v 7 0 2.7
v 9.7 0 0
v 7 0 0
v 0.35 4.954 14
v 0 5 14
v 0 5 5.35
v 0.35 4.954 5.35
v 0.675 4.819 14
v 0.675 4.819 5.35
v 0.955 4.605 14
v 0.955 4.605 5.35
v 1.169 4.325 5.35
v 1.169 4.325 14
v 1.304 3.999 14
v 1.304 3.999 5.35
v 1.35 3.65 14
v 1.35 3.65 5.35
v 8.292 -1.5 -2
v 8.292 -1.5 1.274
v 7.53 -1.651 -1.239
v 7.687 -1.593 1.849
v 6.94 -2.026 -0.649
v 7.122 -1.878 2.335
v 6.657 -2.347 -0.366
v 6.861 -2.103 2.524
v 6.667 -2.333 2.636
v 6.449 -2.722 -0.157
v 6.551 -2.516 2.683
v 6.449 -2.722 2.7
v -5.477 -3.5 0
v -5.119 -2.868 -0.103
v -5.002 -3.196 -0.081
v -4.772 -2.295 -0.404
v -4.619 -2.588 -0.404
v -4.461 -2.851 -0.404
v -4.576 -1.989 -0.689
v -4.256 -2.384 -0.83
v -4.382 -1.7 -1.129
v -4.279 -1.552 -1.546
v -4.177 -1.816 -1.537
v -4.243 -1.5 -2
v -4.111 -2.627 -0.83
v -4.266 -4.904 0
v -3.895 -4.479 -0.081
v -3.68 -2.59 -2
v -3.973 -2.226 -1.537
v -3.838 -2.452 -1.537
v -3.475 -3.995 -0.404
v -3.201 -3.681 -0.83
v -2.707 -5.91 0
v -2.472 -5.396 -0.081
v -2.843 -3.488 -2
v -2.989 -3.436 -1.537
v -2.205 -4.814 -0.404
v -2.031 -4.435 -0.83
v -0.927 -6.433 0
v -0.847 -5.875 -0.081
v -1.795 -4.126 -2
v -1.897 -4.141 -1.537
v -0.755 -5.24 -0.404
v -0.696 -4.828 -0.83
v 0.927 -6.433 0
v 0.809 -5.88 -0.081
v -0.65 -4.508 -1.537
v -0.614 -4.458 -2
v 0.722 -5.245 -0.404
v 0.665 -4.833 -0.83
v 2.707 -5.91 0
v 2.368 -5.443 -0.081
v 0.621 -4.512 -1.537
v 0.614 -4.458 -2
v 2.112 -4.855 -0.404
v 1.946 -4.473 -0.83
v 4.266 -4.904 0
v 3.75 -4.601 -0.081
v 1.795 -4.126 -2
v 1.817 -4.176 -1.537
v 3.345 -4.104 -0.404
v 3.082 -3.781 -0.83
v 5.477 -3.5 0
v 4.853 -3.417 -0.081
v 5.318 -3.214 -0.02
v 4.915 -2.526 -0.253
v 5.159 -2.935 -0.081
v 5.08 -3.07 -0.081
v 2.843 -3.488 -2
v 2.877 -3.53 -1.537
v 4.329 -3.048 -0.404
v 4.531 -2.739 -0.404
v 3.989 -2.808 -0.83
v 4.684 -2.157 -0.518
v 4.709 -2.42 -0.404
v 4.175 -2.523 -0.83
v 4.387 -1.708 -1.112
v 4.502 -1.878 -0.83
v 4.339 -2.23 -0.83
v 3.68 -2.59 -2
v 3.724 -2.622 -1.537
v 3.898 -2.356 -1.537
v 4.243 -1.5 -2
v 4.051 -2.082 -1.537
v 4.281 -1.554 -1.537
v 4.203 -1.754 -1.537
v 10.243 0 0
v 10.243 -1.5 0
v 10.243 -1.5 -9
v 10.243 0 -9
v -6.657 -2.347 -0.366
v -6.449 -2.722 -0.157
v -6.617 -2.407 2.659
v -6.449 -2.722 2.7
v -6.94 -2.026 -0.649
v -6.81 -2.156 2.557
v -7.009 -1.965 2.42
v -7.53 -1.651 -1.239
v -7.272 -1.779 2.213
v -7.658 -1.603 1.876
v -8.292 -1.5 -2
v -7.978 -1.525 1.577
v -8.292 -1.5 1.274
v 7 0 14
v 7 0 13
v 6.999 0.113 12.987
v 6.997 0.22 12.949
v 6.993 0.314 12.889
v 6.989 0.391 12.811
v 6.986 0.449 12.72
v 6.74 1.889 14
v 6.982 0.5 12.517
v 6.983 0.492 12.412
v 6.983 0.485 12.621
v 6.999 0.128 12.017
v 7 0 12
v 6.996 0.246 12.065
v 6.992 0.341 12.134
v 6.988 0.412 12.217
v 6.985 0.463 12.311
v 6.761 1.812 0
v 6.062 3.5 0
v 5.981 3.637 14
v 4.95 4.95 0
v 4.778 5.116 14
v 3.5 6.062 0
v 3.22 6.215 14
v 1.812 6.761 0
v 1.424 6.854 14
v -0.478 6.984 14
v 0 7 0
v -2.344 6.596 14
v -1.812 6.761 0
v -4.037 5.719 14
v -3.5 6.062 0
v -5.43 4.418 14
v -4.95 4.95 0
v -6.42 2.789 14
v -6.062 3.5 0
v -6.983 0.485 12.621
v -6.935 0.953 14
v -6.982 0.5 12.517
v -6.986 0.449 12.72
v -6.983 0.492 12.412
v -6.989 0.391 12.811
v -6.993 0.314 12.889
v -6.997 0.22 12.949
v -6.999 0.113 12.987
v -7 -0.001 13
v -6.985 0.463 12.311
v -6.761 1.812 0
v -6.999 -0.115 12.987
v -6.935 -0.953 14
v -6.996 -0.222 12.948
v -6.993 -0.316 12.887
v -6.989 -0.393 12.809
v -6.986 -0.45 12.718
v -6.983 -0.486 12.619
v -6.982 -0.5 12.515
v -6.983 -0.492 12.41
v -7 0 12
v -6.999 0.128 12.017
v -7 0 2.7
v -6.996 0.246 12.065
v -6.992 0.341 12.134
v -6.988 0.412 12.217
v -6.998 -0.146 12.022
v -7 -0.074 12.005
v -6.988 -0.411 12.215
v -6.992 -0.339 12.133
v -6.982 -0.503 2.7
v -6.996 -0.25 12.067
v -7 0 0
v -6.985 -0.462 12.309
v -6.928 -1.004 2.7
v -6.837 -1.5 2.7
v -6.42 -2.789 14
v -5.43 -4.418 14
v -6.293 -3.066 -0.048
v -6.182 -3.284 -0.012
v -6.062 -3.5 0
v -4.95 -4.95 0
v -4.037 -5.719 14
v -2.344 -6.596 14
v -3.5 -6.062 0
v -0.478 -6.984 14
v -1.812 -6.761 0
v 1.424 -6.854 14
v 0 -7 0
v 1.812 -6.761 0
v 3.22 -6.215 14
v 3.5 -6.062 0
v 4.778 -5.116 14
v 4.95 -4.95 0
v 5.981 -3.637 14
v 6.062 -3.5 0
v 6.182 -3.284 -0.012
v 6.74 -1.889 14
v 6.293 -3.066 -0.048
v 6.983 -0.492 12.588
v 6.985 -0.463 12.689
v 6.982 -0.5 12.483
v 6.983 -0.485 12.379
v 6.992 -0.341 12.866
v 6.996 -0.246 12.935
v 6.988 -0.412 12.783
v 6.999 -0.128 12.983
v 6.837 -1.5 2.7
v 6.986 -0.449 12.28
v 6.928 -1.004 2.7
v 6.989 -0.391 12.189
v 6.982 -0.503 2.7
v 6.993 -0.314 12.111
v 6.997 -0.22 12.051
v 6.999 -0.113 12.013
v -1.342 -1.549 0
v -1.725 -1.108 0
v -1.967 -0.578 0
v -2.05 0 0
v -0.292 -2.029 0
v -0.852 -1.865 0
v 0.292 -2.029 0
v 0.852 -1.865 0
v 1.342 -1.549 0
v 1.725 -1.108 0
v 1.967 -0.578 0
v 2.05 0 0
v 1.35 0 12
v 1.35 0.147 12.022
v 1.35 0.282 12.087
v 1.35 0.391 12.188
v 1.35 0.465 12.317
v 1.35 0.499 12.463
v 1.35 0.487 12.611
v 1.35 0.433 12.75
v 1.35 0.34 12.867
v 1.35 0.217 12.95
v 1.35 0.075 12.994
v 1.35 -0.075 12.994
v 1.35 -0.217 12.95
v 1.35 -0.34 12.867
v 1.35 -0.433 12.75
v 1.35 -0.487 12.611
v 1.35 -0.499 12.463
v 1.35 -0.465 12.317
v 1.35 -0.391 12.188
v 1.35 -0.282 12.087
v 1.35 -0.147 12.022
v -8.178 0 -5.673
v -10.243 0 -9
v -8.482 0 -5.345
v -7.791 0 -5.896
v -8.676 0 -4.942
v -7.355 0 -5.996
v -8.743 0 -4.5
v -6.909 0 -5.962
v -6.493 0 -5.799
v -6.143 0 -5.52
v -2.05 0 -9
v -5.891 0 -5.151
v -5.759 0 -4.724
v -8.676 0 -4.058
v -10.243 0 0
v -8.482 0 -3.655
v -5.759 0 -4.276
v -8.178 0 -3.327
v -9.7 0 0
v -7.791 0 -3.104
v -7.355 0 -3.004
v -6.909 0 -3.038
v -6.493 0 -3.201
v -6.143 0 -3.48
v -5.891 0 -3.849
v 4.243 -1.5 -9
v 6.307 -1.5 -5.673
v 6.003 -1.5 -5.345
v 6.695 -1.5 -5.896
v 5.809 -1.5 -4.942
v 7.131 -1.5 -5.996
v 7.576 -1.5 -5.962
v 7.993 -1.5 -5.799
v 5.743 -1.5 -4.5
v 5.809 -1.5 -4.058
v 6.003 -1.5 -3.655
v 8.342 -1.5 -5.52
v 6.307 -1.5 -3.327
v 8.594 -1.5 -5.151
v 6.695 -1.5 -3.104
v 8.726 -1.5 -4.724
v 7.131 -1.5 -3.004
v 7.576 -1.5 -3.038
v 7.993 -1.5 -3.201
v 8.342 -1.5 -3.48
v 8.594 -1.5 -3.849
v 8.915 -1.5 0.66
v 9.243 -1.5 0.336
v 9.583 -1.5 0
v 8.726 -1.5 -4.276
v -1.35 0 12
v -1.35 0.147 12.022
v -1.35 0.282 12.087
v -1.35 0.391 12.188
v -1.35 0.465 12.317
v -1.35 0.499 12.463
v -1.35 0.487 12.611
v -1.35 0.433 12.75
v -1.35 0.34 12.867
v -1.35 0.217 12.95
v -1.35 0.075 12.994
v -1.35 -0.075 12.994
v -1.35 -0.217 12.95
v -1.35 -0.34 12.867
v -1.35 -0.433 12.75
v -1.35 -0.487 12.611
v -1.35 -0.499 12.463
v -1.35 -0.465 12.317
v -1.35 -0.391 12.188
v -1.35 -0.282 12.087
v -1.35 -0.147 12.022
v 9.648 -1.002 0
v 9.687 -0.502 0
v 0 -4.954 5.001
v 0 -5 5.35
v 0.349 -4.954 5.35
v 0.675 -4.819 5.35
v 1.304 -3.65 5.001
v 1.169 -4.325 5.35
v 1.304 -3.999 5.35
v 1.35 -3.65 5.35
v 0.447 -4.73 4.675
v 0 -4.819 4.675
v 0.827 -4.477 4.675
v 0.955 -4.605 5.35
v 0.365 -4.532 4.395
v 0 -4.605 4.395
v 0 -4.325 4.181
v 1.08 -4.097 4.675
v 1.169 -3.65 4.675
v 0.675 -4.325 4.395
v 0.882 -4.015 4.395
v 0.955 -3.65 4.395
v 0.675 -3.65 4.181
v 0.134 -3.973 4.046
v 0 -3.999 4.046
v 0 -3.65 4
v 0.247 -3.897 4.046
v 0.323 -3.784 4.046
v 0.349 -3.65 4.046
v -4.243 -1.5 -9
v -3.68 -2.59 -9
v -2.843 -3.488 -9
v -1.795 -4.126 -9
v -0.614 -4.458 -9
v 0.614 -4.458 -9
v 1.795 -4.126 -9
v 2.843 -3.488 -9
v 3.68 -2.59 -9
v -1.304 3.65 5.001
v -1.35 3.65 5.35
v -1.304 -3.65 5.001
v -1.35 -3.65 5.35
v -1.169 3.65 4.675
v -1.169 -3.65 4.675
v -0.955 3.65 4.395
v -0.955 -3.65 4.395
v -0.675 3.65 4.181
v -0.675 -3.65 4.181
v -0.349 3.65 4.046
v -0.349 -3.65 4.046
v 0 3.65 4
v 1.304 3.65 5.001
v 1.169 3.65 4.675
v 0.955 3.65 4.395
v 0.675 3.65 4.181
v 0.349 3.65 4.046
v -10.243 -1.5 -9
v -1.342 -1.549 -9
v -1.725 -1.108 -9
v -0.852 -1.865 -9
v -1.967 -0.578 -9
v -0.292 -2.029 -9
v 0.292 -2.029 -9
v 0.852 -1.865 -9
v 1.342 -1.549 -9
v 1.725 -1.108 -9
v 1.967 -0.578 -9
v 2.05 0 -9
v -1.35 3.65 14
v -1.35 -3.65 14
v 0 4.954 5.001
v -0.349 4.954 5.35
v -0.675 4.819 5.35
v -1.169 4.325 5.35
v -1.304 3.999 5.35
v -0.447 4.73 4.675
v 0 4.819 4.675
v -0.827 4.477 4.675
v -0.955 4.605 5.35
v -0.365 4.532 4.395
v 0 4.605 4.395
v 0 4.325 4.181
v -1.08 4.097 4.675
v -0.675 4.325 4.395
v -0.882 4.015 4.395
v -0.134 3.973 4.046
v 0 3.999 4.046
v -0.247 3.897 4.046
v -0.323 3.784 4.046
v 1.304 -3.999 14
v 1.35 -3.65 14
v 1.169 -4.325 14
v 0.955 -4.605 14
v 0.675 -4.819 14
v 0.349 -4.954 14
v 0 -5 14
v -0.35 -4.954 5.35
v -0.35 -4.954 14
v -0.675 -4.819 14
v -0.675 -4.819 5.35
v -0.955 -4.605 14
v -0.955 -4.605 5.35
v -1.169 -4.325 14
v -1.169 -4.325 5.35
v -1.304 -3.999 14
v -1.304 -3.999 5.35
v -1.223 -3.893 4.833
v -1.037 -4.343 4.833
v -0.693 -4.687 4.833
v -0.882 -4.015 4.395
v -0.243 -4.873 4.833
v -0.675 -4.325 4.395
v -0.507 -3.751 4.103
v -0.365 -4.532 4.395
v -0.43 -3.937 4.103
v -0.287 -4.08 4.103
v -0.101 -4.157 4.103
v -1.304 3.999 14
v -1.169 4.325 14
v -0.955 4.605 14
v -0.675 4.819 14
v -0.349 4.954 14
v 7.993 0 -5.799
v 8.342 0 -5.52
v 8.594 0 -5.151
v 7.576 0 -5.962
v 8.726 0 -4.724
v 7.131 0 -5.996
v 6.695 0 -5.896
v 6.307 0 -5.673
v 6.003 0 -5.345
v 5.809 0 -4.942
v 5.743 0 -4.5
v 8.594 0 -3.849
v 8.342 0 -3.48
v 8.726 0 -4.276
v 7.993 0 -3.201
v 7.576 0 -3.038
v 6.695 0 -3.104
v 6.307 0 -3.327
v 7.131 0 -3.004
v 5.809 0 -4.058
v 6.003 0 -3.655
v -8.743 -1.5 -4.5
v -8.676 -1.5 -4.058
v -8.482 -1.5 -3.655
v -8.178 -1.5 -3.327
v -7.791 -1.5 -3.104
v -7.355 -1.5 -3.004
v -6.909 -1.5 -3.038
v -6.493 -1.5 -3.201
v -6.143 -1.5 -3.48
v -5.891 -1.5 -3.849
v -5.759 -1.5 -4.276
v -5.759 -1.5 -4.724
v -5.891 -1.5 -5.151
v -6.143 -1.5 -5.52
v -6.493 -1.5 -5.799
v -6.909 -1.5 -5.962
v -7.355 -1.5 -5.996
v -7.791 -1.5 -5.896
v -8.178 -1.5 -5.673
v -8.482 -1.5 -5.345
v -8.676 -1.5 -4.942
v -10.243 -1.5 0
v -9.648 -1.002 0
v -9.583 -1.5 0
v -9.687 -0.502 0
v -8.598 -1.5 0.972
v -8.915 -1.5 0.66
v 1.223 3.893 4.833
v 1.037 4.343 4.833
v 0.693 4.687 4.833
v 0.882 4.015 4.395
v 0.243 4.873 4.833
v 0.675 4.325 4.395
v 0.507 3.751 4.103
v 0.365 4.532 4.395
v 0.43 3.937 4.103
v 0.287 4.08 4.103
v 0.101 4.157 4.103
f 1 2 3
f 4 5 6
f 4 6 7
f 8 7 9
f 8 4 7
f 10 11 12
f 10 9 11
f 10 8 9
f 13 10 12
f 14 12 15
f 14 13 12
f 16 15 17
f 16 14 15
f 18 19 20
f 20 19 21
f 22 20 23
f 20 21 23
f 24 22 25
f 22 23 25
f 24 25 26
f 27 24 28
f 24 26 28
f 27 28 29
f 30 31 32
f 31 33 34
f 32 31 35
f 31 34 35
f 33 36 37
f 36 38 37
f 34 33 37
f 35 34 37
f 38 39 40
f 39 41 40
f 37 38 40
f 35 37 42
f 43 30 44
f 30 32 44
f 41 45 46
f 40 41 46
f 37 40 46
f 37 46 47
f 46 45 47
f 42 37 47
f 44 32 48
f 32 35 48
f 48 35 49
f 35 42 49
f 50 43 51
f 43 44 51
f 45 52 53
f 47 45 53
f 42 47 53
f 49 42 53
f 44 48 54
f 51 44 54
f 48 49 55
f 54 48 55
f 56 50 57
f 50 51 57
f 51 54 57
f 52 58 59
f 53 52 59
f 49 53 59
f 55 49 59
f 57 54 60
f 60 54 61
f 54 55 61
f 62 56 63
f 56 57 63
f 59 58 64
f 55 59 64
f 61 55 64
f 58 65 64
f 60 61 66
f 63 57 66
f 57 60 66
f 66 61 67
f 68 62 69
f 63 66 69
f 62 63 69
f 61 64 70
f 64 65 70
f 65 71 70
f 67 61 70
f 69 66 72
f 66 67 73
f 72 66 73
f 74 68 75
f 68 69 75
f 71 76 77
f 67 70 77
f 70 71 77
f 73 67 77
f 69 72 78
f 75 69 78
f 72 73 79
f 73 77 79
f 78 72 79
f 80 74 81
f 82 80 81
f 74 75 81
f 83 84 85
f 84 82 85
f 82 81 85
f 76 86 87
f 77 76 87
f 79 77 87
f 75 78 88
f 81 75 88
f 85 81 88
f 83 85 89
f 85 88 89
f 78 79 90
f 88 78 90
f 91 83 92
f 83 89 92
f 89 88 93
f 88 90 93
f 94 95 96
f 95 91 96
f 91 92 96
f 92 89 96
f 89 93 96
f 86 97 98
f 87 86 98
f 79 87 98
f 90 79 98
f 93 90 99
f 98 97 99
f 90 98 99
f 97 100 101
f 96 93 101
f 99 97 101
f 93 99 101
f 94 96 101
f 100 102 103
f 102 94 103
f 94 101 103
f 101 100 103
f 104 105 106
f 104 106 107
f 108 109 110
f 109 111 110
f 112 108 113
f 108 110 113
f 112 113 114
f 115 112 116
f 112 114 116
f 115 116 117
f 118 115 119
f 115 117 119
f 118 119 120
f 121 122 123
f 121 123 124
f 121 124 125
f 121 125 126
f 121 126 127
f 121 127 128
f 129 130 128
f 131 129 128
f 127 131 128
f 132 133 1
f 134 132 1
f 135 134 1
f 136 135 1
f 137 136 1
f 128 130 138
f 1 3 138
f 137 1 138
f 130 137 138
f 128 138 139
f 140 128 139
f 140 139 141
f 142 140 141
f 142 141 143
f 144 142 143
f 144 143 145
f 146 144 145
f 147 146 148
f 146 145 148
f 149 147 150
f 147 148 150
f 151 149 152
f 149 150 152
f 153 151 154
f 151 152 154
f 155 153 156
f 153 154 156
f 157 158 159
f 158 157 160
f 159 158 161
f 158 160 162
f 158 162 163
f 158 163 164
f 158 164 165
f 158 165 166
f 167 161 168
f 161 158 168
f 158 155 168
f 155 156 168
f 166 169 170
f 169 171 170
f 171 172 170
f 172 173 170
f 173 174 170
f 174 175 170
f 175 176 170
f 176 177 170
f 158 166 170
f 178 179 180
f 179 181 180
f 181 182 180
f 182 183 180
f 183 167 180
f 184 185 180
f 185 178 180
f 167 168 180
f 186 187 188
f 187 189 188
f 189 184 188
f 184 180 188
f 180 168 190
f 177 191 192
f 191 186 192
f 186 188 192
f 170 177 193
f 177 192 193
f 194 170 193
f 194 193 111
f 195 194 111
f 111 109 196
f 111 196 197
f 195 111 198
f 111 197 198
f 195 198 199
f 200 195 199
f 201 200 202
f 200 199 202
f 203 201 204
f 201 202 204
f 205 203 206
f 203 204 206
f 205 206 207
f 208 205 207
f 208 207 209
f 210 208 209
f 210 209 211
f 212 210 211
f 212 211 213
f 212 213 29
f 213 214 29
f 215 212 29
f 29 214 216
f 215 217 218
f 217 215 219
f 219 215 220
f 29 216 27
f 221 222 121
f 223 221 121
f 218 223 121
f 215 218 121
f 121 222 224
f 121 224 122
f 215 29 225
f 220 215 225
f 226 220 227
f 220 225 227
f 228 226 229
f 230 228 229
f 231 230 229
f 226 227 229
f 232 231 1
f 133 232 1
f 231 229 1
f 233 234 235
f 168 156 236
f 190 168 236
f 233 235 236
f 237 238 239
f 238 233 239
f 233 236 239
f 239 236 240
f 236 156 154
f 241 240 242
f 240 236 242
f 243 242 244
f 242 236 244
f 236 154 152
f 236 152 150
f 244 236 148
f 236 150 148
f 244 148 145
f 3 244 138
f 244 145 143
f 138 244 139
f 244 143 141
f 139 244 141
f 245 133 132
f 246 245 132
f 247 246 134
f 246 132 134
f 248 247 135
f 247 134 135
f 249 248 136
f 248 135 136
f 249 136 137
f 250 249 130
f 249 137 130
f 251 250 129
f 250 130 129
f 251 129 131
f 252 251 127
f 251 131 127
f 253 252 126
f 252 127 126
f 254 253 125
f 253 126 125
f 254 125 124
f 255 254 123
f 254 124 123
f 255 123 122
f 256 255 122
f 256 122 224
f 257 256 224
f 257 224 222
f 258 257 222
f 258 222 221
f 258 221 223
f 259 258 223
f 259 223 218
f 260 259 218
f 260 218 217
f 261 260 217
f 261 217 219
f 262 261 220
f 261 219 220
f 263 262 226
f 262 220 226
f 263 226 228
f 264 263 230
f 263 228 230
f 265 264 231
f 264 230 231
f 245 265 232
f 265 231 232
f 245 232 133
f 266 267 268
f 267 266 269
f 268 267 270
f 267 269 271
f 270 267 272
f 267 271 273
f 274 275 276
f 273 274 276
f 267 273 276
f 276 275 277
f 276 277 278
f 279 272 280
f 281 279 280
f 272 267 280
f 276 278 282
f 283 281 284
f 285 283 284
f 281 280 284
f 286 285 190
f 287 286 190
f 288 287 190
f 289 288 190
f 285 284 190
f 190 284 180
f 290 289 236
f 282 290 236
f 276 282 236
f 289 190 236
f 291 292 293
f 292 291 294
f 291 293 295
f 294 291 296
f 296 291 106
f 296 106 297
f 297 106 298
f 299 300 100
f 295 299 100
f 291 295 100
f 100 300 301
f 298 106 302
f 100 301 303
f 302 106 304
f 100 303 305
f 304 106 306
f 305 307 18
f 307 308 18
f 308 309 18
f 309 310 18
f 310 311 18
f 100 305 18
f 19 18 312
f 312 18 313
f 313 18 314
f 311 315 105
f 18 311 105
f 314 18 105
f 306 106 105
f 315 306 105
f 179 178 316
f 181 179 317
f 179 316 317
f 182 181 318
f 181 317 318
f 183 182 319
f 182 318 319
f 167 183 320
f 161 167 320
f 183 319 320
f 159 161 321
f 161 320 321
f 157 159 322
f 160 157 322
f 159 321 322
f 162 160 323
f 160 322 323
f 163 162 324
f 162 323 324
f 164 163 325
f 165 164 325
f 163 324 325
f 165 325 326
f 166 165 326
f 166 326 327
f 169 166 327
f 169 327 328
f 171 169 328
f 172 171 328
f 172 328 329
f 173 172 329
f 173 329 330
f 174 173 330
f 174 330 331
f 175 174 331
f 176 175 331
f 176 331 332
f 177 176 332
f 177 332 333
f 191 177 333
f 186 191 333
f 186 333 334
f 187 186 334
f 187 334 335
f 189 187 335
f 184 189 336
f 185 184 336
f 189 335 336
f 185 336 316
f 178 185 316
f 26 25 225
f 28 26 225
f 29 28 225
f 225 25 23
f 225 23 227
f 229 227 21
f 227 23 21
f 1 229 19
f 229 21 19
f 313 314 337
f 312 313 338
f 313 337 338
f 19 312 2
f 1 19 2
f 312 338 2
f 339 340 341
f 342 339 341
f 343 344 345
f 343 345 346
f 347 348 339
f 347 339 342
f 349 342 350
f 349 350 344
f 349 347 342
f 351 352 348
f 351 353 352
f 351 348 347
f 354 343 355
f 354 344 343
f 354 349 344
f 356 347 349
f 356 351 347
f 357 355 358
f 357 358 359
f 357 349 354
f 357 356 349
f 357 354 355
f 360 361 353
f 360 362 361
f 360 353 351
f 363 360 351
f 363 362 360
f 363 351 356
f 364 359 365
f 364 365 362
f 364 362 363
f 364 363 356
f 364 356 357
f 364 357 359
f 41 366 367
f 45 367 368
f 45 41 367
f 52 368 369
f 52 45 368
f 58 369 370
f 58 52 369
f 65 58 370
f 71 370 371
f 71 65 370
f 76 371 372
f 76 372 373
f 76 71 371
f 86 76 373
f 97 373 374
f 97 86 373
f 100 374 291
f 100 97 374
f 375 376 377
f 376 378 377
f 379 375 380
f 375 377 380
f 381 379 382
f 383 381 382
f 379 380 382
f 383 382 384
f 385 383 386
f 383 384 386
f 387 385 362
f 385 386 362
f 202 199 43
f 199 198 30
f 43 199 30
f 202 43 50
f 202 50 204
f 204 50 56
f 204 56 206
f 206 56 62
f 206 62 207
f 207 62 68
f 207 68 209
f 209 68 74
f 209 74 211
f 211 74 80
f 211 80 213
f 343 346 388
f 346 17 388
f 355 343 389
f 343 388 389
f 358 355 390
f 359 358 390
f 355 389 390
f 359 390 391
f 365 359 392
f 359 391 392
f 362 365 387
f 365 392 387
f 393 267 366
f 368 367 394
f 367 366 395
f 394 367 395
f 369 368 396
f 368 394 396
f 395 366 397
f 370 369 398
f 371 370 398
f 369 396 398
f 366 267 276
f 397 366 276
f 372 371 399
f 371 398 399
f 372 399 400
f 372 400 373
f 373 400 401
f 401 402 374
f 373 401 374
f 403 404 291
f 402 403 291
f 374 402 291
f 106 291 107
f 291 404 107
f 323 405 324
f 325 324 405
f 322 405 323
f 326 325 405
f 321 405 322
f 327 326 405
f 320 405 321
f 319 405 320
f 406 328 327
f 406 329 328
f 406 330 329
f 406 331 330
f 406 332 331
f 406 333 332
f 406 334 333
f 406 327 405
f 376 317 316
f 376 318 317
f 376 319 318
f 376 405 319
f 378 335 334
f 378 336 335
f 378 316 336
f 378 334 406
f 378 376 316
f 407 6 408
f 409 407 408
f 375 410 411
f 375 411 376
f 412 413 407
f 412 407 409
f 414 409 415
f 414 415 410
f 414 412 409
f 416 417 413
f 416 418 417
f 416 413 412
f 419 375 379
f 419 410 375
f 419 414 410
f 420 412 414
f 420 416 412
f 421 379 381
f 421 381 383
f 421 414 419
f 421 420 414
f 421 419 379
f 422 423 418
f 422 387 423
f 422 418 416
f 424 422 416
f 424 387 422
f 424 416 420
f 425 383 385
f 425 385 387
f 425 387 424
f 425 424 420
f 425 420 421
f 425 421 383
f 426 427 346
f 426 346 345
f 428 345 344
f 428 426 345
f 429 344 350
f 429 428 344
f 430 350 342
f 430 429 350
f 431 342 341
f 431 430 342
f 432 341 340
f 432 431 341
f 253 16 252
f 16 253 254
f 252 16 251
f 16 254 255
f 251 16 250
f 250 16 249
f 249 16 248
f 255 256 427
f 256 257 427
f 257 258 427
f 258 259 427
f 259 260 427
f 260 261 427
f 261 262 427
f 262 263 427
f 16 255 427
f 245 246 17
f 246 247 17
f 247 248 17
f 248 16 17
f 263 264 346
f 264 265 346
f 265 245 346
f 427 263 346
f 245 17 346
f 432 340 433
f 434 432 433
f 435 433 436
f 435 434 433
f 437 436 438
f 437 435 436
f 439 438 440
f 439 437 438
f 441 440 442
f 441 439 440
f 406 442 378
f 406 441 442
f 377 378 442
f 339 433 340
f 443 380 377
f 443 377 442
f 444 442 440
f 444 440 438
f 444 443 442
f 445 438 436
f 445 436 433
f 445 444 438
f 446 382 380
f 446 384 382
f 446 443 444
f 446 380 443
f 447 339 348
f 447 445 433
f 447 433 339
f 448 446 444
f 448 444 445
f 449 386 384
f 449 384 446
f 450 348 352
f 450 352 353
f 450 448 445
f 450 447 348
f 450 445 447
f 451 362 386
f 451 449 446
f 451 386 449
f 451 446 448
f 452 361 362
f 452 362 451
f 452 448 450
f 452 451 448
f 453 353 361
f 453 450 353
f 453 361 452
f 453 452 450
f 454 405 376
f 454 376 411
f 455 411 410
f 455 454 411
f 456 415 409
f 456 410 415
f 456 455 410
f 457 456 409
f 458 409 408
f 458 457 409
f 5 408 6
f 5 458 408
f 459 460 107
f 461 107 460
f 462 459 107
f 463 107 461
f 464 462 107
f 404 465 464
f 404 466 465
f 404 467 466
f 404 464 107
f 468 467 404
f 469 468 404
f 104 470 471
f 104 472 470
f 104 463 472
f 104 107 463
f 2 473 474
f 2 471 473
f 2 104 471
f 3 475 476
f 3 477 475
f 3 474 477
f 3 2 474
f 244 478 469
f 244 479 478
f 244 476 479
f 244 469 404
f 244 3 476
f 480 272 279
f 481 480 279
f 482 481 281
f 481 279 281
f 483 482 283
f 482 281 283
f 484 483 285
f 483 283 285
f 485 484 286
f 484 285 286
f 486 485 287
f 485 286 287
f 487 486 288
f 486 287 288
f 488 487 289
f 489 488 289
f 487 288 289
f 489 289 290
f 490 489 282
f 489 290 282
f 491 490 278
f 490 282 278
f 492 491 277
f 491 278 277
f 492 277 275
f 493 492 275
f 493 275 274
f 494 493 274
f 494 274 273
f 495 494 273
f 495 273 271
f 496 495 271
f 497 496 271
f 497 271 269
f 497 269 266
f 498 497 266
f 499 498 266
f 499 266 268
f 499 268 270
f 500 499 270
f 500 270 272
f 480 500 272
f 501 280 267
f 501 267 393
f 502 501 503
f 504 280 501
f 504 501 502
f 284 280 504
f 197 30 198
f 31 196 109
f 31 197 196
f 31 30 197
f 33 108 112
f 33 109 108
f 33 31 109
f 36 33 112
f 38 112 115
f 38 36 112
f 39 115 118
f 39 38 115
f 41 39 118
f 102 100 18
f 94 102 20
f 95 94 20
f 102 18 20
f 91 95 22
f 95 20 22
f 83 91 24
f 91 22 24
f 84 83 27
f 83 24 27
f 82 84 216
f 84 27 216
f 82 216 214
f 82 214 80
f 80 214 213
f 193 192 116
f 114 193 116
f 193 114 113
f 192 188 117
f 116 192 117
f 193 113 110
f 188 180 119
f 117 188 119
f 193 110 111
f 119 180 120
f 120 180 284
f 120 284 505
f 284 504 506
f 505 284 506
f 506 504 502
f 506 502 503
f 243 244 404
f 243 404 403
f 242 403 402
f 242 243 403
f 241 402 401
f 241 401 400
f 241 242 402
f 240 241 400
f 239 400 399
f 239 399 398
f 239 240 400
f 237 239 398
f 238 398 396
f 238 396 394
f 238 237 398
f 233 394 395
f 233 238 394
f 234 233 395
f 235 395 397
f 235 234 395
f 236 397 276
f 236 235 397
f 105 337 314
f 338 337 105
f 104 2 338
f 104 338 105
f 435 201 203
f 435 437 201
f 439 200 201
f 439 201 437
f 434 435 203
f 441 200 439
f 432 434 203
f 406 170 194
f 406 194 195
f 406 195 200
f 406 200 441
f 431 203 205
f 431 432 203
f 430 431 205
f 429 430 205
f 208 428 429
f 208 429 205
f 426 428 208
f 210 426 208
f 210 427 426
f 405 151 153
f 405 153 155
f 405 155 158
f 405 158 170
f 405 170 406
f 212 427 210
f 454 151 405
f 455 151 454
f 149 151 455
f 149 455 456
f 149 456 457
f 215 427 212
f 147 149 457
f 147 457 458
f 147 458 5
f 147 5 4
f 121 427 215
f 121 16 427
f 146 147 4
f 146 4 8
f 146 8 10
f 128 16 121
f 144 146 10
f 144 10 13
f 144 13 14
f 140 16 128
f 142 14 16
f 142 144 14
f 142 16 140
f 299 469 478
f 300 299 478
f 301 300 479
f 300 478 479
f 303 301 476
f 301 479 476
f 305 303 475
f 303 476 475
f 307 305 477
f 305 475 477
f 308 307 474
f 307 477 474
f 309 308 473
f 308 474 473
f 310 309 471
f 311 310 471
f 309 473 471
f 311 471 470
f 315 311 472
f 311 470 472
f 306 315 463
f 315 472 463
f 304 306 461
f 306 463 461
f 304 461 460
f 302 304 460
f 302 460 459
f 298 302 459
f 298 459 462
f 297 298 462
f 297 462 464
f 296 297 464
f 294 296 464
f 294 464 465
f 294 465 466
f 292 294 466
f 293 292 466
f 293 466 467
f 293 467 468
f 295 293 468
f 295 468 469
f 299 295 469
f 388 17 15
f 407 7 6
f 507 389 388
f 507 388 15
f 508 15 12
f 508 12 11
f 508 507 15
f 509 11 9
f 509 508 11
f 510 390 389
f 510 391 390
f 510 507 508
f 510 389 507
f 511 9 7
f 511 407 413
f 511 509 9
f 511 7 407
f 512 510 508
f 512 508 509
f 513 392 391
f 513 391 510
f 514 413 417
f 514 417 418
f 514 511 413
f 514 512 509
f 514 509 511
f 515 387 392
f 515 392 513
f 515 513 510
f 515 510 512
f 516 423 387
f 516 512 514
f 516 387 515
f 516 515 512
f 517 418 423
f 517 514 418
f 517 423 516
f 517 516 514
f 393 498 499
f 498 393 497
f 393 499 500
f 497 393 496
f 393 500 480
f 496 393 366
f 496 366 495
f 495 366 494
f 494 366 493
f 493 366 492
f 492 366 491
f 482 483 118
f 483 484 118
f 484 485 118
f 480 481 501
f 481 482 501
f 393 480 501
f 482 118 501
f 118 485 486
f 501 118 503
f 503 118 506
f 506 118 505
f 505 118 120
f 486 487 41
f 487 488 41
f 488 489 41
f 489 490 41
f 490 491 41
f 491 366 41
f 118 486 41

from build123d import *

# Parameters (mm, degrees)
SKETCH1_R           = 7
BOSS_EXTRUDE1_DEPTH = 4
SKETCH2_R           = 7
SKETCH2_R_2         = 5
BOSS_EXTRUDE2_DEPTH = 10
BOSS_EXTRUDE3_DEPTH = 10
BOSS_EXTRUDE4_DEPTH = 9
FILLET3_R           = 1.35
CHAMFER1_SIZE       = 2.7
SKETCH7_R           = 1.5
CUT_EXTRUDE1_DEPTH  = 10
FILLET4_R           = 2
SKETCH8_R           = 0.5
CUT_EXTRUDE2_DEPTH  = 25.534299997


# Some blends are built 0.0001 mm under size
with BuildPart() as part:
    # Sketch1 → Boss-Extrude1 (new body)
    with BuildSketch(Plane.XY):
        Circle(SKETCH1_R)
    extrude(amount=BOSS_EXTRUDE1_DEPTH)

    # Sketch2 → Boss-Extrude2 (add)
    with BuildSketch(Plane.XY.offset(4)):
        Circle(SKETCH2_R)
        Circle(SKETCH2_R_2, mode=Mode.SUBTRACT)
    extrude(amount=BOSS_EXTRUDE2_DEPTH)

    # Sketch3 → Boss-Extrude3 (add)
    with BuildSketch(Plane.XY.offset(4)):
        with BuildLine():
            Line((-1.35, 4.814301611), (-1.35, -4.814301611))
            ThreePointArc((-1.35, -4.814301611), (-5, 0), (-1.35, 4.814301611))
        make_face()
        with BuildLine():
            Line((1.35, 4.814301611), (1.35, -4.814301611))
            ThreePointArc((1.35, -4.814301611), (5, 0), (1.35, 4.814301611))
        make_face()
    extrude(amount=BOSS_EXTRUDE3_DEPTH)

    # Sketch4 → Boss-Extrude4 (add)
    with BuildSketch(Plane(origin=(0, 0, 0), x_dir=(-1, 0, 0), z_dir=(0, 0, -1))):
        with BuildLine():
            Line((2.05, 0), (4.242640687, 0))
            Line((4.242640687, 0), (10.242640687, 0))
            Line((10.242640687, 0), (10.242640687, -1.5))
            Line((10.242640687, -1.5), (4.242640687, -1.5))
            ThreePointArc((4.242640687, -1.5), (0, -4.5), (-4.242640687, -1.5))
            Line((-4.242640687, -1.5), (-10.242640687, -1.5))
            Line((-10.242640687, -1.5), (-10.242640687, 0))
            Line((-10.242640687, 0), (-4.242640687, 0))
            Line((-4.242640687, 0), (-2.05, 0))
            ThreePointArc((-2.05, 0), (0, -2.05), (2.05, 0))
        make_face()
    extrude(amount=BOSS_EXTRUDE4_DEPTH)

    # Fillet3
    fillet3_edges = [part.edges().sort_by_distance(p)[0] for p in [
        (-1.35, 4.814301611, 9),
    ]]
    fillet(fillet3_edges, radius=FILLET3_R)
    fillet3_2_edges = [part.edges().sort_by_distance(p)[0] for p in [
        (1.35, 4.814301611, 9),
    ]]
    fillet(fillet3_2_edges, radius=FILLET3_R - 0.0001)  # a hair under: the kernel refuses the full size
    fillet3_3_edges = [part.edges().sort_by_distance(p)[0] for p in [
        (1.35, -4.814301611, 9),
    ]]
    fillet(fillet3_3_edges, radius=FILLET3_R)
    fillet3_4_edges = [part.edges().sort_by_distance(p)[0] for p in [
        (-1.35, -4.814301611, 9),
    ]]
    fillet(fillet3_4_edges, radius=FILLET3_R - 0.0001)  # a hair under: the kernel refuses the full size
    fillet3_5_edges = [part.edges().sort_by_distance(p)[0] for p in [
        (-1.35, -4.9999e-05, 4),
    ]]
    fillet(fillet3_5_edges, radius=FILLET3_R - 0.0001)  # a hair under: the kernel refuses the full size

    # Chamfer1
    # the kernel refuses this chamfer: 2.7 mm, written as the material it adds along each edge
    with BuildSketch(Plane(origin=(0, 0, 0), x_dir=(-1, 0, 0), z_dir=(0, 1, 0))) as chamfer1_piece_1_section:
        Polygon((7, CHAMFER1_SIZE), (7 + CHAMFER1_SIZE, 0), (7, 0), align=None)
    chamfer1_piece_1 = revolve(axis=Axis((0, 0, 0), (0, 0, 1)), revolution_arc=69.20773796, mode=Mode.PRIVATE)
    chamfer1_piece_1 = split(chamfer1_piece_1, bisect_by=Plane(origin=(-7.851109484, -1.5, 0.900303531), z_dir=(0, 1, 0)), keep=Keep.TOP, mode=Mode.PRIVATE)
    add(chamfer1_piece_1)
    with BuildSketch(Plane(origin=(0, 0, 0), x_dir=(0.3549807082679851, -0.9348736260894087, 0), z_dir=(-0.9348736260894087, -0.3549807082679851, 0))) as chamfer1_piece_2_section:
        Polygon((7, CHAMFER1_SIZE), (7 + CHAMFER1_SIZE, 0), (7, 0), align=None)
    chamfer1_piece_2 = revolve(axis=Axis((0, 0, 0), (0, 0, 1)), revolution_arc=69.20773796, mode=Mode.PRIVATE)
    chamfer1_piece_2 = split(chamfer1_piece_2, bisect_by=Plane(origin=(7.851109484, -1.5, 0.900303531), z_dir=(0, 1, 0)), keep=Keep.TOP, mode=Mode.PRIVATE)
    add(chamfer1_piece_2)

    # Sketch7 → Cut-Extrude1 (cut)
    with BuildSketch(Plane(origin=(0, 0, 0), x_dir=(1, 0, 0), z_dir=(0, 1, 0))):
        with Locations(Location((7.242640687, 4.5, 0), (0, 0, 180))):
            Circle(SKETCH7_R)
        with Locations(Location((-7.242640687, 4.5, 0), (0, 0, 180))):
            Circle(SKETCH7_R)
    extrude(amount=-CUT_EXTRUDE1_DEPTH, mode=Mode.SUBTRACT)

    # Fillet4
    fillet4_edges = [part.edges().sort_by_distance(p)[0] for p in [
        (-6.837397166, -1.5, 1.35),
        (6.837397166, -1.5, 1.35),
        (-5.540018926, -1.5, 0),
        (5.540018926, -1.5, 0),
        (0, -4.5, 0),
    ]]
    fillet(fillet4_edges, radius=FILLET4_R)

    # Sketch8 → Cut-Extrude2 (cut, through all)
    with BuildSketch(Plane(origin=(8.65, 0, 0), x_dir=(0, 0, -1), z_dir=(1, 0, 0))):
        with Locations((-12.5, 0)):
            Circle(SKETCH8_R)
    extrude(amount=-CUT_EXTRUDE2_DEPTH, mode=Mode.SUBTRACT)


solid = part.part
